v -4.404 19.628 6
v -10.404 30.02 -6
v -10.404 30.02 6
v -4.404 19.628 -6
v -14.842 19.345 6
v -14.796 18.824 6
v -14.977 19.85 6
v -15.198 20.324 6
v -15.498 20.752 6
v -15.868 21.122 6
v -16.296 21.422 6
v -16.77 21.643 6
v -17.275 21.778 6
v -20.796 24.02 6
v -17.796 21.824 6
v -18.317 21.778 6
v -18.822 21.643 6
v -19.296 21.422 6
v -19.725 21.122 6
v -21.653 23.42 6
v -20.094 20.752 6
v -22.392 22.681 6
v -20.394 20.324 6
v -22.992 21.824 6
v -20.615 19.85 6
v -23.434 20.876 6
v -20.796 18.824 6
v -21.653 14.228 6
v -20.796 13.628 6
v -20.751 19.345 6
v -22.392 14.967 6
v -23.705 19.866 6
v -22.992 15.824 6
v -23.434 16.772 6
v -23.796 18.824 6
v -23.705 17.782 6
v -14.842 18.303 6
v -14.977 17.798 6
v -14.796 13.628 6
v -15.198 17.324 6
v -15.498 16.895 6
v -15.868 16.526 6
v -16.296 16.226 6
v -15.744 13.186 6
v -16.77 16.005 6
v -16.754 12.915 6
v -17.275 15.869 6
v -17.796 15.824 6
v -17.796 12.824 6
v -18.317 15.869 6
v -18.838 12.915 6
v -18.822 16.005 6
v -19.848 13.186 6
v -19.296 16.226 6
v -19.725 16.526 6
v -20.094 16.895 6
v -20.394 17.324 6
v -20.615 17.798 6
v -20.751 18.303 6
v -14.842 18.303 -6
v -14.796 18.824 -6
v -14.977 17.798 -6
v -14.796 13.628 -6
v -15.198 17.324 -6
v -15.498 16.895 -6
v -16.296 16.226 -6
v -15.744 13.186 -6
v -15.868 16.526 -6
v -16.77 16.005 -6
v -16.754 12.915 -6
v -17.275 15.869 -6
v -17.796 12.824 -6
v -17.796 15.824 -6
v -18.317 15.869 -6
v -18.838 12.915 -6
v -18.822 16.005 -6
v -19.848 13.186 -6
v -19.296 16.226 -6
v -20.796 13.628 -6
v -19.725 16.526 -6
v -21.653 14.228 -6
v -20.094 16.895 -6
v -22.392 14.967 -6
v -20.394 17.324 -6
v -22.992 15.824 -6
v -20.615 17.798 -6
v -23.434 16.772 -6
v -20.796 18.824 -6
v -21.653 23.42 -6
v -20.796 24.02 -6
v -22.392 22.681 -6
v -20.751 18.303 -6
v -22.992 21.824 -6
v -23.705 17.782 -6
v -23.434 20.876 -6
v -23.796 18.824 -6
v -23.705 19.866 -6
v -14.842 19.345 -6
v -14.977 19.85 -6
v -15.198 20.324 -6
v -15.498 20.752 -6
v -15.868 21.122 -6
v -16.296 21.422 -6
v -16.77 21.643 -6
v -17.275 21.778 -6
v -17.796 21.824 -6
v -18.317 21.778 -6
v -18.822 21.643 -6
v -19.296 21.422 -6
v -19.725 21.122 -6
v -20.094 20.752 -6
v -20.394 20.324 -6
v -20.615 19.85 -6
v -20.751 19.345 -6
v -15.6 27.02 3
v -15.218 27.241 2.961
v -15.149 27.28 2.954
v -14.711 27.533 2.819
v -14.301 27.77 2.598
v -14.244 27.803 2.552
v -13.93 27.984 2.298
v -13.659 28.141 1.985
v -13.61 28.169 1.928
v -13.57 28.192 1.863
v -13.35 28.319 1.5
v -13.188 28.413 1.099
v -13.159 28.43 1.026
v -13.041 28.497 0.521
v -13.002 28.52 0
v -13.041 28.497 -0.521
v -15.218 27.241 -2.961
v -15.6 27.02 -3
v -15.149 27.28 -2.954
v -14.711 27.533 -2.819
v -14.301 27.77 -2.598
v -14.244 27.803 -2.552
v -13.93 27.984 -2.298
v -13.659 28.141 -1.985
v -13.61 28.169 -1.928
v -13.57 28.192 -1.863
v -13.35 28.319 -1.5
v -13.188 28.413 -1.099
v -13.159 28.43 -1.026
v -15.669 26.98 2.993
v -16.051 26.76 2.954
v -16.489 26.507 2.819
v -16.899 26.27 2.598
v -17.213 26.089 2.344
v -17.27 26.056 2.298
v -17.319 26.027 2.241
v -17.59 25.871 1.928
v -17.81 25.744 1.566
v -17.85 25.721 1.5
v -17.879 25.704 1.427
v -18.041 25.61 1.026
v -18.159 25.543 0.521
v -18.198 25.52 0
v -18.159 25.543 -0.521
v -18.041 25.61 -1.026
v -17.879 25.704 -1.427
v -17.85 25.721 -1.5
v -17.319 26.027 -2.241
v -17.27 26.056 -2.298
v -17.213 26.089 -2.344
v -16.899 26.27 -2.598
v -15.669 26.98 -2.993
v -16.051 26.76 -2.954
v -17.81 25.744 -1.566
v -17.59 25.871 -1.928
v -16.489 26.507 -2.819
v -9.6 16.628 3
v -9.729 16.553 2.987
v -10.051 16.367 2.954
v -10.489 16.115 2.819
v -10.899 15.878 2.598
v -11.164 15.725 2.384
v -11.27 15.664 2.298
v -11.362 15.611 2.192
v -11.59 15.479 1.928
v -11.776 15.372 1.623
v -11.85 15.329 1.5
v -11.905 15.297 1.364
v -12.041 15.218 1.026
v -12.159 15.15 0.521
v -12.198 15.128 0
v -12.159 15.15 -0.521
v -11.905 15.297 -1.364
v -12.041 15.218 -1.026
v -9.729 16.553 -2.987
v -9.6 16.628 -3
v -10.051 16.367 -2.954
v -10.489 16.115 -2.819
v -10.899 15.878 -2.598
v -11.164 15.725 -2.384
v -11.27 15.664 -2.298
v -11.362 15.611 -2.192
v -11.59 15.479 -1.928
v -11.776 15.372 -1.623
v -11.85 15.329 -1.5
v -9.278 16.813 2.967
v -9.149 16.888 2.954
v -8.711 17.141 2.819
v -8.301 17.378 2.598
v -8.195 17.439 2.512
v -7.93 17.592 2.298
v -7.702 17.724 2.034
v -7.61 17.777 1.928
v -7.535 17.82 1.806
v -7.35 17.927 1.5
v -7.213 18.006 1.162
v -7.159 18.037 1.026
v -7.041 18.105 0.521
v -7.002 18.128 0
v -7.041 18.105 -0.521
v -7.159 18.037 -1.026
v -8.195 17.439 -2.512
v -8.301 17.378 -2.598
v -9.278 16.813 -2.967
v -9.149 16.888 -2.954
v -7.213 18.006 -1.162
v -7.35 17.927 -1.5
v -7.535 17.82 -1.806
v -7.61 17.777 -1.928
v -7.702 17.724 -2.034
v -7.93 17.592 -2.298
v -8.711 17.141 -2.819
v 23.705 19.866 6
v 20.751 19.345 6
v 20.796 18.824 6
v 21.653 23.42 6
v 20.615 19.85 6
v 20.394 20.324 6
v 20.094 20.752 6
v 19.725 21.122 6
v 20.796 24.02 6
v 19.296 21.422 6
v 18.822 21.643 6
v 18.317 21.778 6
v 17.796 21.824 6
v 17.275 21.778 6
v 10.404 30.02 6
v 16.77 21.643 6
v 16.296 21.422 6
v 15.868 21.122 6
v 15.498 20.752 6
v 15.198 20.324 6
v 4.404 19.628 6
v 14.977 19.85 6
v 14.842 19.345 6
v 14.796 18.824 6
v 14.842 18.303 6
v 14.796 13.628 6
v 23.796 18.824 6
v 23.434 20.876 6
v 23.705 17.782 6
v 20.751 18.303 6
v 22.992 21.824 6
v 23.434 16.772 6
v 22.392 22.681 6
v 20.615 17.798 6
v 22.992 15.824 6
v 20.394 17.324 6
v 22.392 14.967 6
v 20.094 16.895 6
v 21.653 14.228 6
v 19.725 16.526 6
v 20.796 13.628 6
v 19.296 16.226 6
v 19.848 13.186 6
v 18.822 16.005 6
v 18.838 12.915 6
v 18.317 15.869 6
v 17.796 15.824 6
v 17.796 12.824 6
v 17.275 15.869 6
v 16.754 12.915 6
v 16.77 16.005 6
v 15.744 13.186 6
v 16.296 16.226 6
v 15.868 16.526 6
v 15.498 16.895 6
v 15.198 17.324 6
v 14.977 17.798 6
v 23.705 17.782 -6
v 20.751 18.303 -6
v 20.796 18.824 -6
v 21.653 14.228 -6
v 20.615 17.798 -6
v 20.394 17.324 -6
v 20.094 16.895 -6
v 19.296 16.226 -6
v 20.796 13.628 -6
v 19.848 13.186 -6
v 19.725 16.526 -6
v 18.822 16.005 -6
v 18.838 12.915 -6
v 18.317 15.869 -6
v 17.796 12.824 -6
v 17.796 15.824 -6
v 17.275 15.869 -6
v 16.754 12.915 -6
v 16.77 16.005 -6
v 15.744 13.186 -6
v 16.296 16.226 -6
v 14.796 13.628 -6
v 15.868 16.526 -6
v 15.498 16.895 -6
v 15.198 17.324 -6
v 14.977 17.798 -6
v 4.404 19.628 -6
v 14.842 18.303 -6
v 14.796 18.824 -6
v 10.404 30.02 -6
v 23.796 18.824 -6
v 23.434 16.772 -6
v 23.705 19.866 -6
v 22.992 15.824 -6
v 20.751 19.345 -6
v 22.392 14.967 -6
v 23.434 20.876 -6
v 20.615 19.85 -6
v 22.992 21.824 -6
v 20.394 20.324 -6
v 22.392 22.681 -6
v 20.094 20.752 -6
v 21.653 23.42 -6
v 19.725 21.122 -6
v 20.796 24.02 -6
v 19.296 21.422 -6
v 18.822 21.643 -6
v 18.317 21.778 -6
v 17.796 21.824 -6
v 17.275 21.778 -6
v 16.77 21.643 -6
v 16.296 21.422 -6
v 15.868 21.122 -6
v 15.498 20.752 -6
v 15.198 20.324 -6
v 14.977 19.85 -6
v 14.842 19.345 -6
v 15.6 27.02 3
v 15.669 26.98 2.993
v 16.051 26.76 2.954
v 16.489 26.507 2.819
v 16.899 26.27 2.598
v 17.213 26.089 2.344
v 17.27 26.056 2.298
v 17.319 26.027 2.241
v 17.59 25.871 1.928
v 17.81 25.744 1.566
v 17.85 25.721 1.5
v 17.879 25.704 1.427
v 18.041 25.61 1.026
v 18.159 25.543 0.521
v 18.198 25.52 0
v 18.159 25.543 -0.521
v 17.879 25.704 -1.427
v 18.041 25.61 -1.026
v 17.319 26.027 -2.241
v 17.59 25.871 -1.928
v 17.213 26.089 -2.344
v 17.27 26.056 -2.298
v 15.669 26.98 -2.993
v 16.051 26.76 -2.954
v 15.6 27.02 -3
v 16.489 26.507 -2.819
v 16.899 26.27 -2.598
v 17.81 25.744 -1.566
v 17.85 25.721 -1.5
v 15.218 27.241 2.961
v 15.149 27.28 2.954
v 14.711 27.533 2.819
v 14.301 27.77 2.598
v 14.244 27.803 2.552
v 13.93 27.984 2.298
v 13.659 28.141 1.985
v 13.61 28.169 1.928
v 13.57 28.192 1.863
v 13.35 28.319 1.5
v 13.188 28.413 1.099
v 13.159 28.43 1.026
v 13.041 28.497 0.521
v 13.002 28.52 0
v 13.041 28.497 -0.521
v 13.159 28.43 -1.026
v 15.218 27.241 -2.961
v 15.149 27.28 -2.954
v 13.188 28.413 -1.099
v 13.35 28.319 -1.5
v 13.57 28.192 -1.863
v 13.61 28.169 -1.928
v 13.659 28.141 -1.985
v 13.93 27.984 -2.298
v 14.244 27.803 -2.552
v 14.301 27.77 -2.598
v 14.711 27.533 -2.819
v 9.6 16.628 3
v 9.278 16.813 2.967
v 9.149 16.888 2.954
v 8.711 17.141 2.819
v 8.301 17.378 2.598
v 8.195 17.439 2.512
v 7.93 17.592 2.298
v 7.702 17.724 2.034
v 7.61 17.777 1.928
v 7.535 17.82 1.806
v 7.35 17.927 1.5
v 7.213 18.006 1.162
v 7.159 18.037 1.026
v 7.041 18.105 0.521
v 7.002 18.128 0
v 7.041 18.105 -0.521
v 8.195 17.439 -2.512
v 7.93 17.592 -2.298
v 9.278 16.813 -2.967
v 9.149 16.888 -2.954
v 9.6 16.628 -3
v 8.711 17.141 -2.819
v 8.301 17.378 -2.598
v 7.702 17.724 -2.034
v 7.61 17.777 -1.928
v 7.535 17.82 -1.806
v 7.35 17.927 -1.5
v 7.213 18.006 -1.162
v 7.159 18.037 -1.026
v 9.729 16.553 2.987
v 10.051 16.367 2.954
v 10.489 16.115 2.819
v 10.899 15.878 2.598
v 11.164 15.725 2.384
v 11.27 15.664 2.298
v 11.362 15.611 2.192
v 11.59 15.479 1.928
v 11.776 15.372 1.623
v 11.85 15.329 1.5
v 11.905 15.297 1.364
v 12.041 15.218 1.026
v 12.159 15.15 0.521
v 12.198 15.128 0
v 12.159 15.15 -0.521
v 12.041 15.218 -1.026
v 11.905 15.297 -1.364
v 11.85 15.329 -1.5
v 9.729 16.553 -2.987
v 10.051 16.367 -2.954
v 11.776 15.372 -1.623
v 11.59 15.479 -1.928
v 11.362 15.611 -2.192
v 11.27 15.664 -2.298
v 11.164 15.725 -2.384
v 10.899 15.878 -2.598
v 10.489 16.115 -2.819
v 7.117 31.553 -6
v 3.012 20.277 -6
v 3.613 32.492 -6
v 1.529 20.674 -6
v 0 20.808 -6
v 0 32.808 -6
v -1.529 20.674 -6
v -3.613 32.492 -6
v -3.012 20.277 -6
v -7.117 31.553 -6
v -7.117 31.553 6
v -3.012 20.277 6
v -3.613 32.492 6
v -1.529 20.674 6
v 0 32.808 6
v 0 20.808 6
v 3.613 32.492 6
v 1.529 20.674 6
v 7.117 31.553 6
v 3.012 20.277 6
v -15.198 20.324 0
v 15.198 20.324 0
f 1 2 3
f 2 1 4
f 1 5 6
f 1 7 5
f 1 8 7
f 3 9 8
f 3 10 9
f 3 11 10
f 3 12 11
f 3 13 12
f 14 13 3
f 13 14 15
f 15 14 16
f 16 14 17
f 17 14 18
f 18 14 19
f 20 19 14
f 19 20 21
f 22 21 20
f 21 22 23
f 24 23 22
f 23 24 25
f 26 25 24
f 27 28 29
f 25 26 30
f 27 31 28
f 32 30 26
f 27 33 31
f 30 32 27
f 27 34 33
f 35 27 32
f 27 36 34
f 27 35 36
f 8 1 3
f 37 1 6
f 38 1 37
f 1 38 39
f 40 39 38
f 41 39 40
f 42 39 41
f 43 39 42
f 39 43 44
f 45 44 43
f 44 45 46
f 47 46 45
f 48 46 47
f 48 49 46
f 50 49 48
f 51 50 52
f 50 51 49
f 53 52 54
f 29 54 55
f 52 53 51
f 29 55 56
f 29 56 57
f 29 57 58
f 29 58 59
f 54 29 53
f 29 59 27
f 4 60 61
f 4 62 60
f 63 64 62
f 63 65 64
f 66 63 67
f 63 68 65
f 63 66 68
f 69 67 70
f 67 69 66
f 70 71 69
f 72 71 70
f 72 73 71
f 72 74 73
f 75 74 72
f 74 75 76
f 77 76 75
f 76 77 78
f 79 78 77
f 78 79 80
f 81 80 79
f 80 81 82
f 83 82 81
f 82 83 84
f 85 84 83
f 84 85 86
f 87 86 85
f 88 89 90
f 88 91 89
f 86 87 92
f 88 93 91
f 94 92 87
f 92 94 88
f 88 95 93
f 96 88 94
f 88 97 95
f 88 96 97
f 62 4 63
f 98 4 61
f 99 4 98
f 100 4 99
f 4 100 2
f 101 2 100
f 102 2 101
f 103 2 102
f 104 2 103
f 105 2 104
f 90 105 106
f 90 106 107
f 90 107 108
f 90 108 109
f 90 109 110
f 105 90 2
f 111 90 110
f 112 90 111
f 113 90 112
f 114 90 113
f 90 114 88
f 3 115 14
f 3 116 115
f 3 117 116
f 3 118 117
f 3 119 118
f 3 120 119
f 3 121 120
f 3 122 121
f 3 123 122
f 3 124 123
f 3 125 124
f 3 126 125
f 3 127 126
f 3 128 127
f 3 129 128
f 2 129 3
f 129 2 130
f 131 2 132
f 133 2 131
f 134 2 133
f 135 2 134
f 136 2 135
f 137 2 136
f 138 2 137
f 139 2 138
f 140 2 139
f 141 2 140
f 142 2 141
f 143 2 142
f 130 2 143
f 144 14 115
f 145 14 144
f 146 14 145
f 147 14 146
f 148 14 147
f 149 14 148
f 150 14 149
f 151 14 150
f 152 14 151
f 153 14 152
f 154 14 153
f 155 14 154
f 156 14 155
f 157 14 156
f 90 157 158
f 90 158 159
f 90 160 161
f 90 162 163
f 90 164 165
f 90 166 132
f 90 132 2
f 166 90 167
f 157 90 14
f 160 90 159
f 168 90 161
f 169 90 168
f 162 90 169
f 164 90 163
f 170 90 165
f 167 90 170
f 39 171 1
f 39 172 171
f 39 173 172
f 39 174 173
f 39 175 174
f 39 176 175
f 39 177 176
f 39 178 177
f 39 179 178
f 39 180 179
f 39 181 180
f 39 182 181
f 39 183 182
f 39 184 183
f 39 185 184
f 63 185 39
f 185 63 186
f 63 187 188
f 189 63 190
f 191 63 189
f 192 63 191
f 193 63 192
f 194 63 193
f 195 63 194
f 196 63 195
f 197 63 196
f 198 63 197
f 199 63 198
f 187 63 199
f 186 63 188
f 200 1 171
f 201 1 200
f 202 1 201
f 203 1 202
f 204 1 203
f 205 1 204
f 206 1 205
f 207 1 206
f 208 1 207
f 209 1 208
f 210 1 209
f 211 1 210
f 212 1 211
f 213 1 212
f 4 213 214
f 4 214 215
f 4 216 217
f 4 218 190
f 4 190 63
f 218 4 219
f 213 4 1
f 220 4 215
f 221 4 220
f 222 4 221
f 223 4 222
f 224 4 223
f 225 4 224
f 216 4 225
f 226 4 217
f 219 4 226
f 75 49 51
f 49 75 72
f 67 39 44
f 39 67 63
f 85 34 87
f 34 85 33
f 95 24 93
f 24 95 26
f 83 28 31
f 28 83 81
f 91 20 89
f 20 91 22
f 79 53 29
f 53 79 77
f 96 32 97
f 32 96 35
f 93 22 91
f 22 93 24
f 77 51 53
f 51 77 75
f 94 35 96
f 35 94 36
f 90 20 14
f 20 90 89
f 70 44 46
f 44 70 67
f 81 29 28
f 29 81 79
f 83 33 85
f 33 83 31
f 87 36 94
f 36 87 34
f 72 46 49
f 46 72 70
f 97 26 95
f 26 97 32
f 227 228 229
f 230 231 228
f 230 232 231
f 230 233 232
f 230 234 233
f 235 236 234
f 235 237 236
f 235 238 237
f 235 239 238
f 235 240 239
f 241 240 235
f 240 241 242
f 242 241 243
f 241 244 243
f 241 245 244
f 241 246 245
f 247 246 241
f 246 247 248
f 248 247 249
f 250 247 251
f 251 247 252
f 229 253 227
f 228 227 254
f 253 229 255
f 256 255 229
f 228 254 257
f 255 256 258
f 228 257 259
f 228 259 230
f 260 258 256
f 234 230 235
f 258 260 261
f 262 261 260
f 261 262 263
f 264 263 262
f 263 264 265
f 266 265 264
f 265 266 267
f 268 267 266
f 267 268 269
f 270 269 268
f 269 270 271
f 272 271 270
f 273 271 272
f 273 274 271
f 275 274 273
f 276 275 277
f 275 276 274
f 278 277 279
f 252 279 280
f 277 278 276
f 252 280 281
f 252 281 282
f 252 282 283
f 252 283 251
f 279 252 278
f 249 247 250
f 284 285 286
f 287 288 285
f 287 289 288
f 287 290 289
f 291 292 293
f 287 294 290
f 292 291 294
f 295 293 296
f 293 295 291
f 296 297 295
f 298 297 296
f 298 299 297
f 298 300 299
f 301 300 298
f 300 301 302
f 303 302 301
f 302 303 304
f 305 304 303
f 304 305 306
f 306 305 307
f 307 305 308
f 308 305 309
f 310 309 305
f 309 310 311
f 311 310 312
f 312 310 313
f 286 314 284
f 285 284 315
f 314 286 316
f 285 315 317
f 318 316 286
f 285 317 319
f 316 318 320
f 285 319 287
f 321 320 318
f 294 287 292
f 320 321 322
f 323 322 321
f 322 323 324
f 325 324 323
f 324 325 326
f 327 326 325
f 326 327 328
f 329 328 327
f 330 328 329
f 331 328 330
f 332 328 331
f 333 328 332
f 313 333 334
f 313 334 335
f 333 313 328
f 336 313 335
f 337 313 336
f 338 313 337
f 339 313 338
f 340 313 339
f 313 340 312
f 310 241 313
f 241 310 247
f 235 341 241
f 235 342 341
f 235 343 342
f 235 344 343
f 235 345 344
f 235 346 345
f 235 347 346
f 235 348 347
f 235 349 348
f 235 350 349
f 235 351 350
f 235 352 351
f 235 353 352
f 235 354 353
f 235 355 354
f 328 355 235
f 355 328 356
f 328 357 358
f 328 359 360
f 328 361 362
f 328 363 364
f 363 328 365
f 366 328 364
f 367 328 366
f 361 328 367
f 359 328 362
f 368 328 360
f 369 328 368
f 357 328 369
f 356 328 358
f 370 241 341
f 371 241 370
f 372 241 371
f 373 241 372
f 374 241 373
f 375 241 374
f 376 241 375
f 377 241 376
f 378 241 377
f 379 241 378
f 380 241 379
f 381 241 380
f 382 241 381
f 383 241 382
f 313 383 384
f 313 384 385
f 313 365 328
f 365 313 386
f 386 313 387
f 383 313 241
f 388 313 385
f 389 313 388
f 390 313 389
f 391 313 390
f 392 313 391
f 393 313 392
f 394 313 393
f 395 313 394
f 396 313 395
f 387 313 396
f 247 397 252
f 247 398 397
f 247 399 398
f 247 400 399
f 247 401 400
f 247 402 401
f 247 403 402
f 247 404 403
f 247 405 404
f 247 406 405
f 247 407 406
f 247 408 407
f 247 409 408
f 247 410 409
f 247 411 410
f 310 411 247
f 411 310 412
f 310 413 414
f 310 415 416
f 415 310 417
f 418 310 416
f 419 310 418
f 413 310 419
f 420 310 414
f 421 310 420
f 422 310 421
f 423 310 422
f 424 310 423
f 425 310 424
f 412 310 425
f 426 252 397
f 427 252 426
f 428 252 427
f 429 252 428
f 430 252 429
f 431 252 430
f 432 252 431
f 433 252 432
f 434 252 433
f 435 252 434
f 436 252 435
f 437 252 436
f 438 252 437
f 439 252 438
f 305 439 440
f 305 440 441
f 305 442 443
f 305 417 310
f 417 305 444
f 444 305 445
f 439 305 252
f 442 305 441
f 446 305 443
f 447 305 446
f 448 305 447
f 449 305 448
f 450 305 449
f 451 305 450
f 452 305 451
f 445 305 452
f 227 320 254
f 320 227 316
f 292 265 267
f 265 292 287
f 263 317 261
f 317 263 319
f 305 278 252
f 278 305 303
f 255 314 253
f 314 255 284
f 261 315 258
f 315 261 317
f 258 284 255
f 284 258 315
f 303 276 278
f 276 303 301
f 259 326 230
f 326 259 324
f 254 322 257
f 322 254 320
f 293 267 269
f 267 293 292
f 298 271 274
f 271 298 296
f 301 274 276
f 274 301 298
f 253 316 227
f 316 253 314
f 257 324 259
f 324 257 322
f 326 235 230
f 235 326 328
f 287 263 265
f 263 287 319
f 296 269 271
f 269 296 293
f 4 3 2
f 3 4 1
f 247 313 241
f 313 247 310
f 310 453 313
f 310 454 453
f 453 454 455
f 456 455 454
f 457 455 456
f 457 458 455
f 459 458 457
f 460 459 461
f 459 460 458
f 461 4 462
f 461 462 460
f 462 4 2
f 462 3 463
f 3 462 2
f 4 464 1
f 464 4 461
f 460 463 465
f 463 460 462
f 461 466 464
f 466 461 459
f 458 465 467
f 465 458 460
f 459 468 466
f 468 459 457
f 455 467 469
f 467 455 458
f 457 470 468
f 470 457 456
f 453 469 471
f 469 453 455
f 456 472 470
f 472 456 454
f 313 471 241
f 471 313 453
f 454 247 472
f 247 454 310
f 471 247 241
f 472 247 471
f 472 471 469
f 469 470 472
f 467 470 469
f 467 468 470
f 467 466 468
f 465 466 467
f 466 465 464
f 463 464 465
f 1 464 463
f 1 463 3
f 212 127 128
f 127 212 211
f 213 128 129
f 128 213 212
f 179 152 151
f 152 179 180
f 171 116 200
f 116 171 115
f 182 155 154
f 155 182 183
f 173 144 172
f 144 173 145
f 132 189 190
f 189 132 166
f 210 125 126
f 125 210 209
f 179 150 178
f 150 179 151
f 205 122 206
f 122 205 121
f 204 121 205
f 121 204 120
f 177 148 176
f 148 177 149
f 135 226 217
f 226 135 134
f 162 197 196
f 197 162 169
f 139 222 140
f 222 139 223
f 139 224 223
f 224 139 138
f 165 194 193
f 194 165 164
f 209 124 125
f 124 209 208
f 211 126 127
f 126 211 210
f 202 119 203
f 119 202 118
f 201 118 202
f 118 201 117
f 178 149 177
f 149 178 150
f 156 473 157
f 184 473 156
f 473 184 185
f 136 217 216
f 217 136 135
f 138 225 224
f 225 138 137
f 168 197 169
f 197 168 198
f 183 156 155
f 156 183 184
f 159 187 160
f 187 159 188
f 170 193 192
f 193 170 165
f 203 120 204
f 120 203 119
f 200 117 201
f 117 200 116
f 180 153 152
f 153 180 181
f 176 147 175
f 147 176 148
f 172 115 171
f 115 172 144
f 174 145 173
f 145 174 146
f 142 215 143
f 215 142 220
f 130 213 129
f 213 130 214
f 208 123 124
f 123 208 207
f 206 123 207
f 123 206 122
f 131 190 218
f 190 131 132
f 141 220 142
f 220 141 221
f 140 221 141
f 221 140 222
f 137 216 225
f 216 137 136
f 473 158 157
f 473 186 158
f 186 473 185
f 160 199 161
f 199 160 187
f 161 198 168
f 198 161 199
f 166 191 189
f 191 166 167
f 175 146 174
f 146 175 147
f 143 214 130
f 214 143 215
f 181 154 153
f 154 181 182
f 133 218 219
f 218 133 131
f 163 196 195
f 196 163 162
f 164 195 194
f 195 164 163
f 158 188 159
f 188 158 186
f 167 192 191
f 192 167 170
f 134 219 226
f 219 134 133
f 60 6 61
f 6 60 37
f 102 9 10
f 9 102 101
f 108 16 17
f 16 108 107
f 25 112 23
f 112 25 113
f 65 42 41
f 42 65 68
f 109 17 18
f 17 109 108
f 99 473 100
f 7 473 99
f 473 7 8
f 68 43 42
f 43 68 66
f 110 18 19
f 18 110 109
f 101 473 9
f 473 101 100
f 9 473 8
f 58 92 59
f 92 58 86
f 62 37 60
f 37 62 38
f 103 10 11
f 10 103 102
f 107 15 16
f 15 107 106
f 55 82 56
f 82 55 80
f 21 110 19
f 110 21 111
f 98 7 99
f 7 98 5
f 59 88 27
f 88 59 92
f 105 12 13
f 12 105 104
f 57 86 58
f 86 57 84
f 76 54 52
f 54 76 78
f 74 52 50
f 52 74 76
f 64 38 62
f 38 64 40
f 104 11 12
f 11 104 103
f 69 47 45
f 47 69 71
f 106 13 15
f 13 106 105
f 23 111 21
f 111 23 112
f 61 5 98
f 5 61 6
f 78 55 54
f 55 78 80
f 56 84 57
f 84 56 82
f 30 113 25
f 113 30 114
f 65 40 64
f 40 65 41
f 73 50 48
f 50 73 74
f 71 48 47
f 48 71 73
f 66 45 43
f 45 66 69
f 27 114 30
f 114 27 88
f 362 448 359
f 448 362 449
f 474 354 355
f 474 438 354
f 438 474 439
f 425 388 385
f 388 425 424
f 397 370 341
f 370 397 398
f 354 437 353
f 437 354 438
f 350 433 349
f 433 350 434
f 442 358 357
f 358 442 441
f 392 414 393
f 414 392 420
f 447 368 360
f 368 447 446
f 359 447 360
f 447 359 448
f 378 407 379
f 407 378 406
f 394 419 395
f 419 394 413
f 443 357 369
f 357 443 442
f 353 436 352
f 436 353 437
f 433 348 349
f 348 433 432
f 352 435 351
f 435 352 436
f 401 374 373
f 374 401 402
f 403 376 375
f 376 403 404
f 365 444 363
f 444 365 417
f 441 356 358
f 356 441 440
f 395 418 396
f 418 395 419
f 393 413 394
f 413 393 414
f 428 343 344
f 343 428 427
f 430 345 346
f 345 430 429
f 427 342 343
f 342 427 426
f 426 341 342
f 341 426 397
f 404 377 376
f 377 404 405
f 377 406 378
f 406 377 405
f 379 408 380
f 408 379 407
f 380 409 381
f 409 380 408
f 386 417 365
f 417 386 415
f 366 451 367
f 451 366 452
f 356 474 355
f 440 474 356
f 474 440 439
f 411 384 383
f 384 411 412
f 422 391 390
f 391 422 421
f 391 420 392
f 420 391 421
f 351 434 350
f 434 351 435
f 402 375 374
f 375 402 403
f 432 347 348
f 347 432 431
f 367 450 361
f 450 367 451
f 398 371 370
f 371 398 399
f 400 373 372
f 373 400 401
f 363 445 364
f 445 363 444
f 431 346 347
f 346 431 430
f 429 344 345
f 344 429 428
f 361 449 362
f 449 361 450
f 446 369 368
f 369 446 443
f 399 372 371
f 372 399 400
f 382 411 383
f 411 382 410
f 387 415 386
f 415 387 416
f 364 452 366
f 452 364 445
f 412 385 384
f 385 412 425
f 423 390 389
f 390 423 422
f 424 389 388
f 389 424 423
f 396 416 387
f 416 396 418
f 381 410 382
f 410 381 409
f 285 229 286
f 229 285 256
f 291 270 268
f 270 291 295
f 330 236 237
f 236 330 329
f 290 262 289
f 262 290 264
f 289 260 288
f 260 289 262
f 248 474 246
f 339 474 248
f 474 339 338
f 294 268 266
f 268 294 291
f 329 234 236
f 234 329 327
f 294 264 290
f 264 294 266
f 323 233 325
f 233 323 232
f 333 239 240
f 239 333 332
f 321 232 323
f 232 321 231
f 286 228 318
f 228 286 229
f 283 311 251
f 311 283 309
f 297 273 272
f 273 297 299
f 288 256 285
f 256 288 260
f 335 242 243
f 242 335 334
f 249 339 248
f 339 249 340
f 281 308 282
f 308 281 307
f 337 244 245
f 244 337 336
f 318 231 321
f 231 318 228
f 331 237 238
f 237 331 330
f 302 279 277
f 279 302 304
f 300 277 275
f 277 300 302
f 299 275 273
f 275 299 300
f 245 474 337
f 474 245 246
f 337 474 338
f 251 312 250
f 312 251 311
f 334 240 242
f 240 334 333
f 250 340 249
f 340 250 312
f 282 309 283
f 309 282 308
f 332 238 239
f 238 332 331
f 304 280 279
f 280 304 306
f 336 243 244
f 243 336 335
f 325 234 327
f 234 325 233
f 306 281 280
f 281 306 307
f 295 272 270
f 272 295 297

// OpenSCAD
// file: hardware.scad
include <settings.scad>;


module rod(length, threaded) if (threaded && renderrodthreads) {
	linear_extrude(height = length, center = true, convexity = 10, twist = -360 * length / rodpitch, $fn = fn)
		translate([rodsize * 0.1 / 2, 0, 0])
			circle(r = rodsize * 0.9 / 2, $fn = fn);
} else cylinder(h = length, r = rodsize / 2, center = true, $fn = fn);


module rodnut(position, washer) render() translate([0, 0, position]) {
	intersection() {
		scale([1, 1, 0.5]) sphere(r = 1.05 * rodsize, center = true);
		difference() {
			cylinder (h = rodnutsize, r = rodnutdiameter / 2, center = true, $fn = 6);
			rod(rodnutsize + 0.1);
		}
	}
	if (washer == 1 || washer == 4) rodwasher(((position > 0) ? -1 : 1) * (rodnutsize + rodwashersize) / 2);
	if (washer == 2 || washer == 4) rodwasher(((position > 0) ? 1 : -1) * (rodnutsize + rodwashersize) / 2);
}


module rodwasher(position) render() translate ([0, 0, position]) difference() {
	cylinder(r = rodwasherdiameter / 2, h = rodwashersize, center = true, $fn = fn);
	rod(rodwashersize + 0.1);
}


module screw(length, nutpos, washer, bearingpos = -1) union(){
	translate([0, 0, -length / 2]) if (renderscrewthreads) {
		linear_extrude(height = length, center = true, convexity = 10, twist = -360 * length / screwpitch, $fn = fn)
			translate([screwsize * 0.1 / 2, 0, 0])
				circle(r = screwsize * 0.9 / 2, $fn = fn);
	} else cylinder(h = length, r = screwsize / 2, center = true, $fn = fn);
	render() difference() {
		translate([0, 0, screwsize / 2]) cylinder(h = screwsize, r = screwsize, center = true, $fn = fn);
		translate([0, 0, screwsize]) cylinder(h = screwsize, r = screwsize / 2, center = true, $fn = 6);
	}
	if (washer > 0 && nutpos > 0) {
		washer(nutpos);
		nut(nutpos + washersize);
	} else if (nutpos > 0) nut(nutpos);
	if (bearingpos >= 0) bearing(bearingpos);
}


module bearing(position) render() translate([0, 0, -position - bearingwidth / 2]) union() {
	difference() {
		cylinder(h = bearingwidth, r = bearingsize / 2, center = true, $fn = fn);
		cylinder(h = bearingwidth * 2, r = bearingsize / 2 - 1, center = true, $fn = fn);
	}
	difference() {
		cylinder(h = bearingwidth - 0.5, r = bearingsize / 2 - 0.5, center = true, $fn = fn);
		cylinder(h = bearingwidth * 2, r = screwsize / 2 + 0.5, center = true, $fn = fn);
	}
	difference() {
		cylinder(h = bearingwidth, r = screwsize / 2 + 1, center = true, $fn = fn);
		cylinder(h = bearingwidth + 0.1, r = screwsize / 2, center = true, $fn = fn);
	}
}


module nut(position, washer) render() translate([0, 0, -position - nutsize / 2]) {
	intersection() {
		scale([1, 1, 0.5]) sphere(r = 1.05 * screwsize, center = true);
		difference() {
			cylinder (h = nutsize, r = nutdiameter / 2, center = true, $fn = 6);
			cylinder(r = screwsize / 2, h = nutsize + 0.1, center = true, $fn = fn);
		}
	}
	if (washer > 0) washer(0);
}


module washer(position) render() translate ([0, 0, -position - washersize / 2]) difference() {
	cylinder(r = washerdiameter / 2, h = washersize, center = true, $fn = fn);
	cylinder(r = screwsize / 2, h = washersize + 0.1, center = true, $fn = fn);
}


rod(20);
translate([rodsize * 2.5, 0, 0]) rod(20, true);
translate([rodsize * 5, 0, 0]) screw(10, true);
translate([rodsize * 7.5, 0, 0]) bearing();
translate([rodsize * 10, 0, 0]) rodnut();
translate([rodsize * 12.5, 0, 0]) rodwasher();
translate([rodsize * 15, 0, 0]) nut();
translate([rodsize * 17.5, 0, 0]) washer();
// file: settings.scad
rodsize = 6;	//threaded/smooth rod diameter in mm
xaxis = 182.5;	//width of base in mm
yaxis = 266.5;	//length of base in mm


screwsize = 3;	//bearing bore/screw diameter in mm
bearingsize = 10;	//outer diameter of bearings in mm
bearingwidth = 4;	//width of bearings in mm


rodpitch = rodsize / 6;
rodnutsize = 0.8 * rodsize;
rodnutdiameter = 1.9 * rodsize;
rodwashersize = 0.2 * rodsize;
rodwasherdiameter = 2 * rodsize;
screwpitch = screwsize / 6;
nutsize = 0.8 * screwsize;
nutdiameter = 1.9 * screwsize;
washersize = 0.2 * screwsize;
washerdiameter = 2 * screwsize;
partthick = 2 * rodsize;
vertexrodspace = 2 * rodsize;


c = [0.3, 0.3, 0.3];
rodendoffset = rodnutsize + rodwashersize * 2 + partthick / 2;
vertexoffset = vertexrodspace + rodendoffset;


renderrodthreads = false;
renderscrewthreads = false;
fn = 36;
// main file
// TODO: add foot

include <settings.scad>;
use <hardware.scad>;

module frame_vertex(round = false, foot = false) color(c) difference() {
	union() {
		for(side = [1, -1]) {
			rotate([0, 0, side * 30]) translate([0, vertexoffset, 0]) {
				if (round) {
					translate([-side * partthick / 4, 0, 0]) cube([partthick  / 2, partthick, partthick], center = true);
					rotate([0, 90, 0]) cylinder(h = partthick, r = partthick / 2, center = true, $fn = fn);
					rotate([90, 0, 0]) cylinder(h = partthick, r = partthick / 2, center = true, $fn = fn);
				} else cube([partthick, partthick, partthick], center = true);
				translate([side * -rodsize, 0, 0]) cylinder(h = partthick, r = partthick / 2, center = true, $fn = fn);
			}
		}
		translate([0, partthick, 0]) difference() {
			rotate_extrude(convexity = 10, $fn = fn) translate([vertexoffset - partthick * sqrt(3) / 2, 0, 0]) {
				if (round) circle(r = partthick / 2, center = true, $fn = fn);
				else square(size = partthick, center = true);
			}
			for (side = [1, -1]) rotate([0, 0, side * 30]) translate([-side * vertexoffset, 0, 0]) cube(vertexoffset * 2, center = true);
		}
	}
	for(side = [1, -1]) {
		rotate([90, 0, side * 30]) rod(rodsize * 15);
		rotate([0, 0, side * 30]) {
			translate([-side * rodsize, vertexoffset, 0]) rod(partthick * 2);
		}
	}
}

frame_vertex();
